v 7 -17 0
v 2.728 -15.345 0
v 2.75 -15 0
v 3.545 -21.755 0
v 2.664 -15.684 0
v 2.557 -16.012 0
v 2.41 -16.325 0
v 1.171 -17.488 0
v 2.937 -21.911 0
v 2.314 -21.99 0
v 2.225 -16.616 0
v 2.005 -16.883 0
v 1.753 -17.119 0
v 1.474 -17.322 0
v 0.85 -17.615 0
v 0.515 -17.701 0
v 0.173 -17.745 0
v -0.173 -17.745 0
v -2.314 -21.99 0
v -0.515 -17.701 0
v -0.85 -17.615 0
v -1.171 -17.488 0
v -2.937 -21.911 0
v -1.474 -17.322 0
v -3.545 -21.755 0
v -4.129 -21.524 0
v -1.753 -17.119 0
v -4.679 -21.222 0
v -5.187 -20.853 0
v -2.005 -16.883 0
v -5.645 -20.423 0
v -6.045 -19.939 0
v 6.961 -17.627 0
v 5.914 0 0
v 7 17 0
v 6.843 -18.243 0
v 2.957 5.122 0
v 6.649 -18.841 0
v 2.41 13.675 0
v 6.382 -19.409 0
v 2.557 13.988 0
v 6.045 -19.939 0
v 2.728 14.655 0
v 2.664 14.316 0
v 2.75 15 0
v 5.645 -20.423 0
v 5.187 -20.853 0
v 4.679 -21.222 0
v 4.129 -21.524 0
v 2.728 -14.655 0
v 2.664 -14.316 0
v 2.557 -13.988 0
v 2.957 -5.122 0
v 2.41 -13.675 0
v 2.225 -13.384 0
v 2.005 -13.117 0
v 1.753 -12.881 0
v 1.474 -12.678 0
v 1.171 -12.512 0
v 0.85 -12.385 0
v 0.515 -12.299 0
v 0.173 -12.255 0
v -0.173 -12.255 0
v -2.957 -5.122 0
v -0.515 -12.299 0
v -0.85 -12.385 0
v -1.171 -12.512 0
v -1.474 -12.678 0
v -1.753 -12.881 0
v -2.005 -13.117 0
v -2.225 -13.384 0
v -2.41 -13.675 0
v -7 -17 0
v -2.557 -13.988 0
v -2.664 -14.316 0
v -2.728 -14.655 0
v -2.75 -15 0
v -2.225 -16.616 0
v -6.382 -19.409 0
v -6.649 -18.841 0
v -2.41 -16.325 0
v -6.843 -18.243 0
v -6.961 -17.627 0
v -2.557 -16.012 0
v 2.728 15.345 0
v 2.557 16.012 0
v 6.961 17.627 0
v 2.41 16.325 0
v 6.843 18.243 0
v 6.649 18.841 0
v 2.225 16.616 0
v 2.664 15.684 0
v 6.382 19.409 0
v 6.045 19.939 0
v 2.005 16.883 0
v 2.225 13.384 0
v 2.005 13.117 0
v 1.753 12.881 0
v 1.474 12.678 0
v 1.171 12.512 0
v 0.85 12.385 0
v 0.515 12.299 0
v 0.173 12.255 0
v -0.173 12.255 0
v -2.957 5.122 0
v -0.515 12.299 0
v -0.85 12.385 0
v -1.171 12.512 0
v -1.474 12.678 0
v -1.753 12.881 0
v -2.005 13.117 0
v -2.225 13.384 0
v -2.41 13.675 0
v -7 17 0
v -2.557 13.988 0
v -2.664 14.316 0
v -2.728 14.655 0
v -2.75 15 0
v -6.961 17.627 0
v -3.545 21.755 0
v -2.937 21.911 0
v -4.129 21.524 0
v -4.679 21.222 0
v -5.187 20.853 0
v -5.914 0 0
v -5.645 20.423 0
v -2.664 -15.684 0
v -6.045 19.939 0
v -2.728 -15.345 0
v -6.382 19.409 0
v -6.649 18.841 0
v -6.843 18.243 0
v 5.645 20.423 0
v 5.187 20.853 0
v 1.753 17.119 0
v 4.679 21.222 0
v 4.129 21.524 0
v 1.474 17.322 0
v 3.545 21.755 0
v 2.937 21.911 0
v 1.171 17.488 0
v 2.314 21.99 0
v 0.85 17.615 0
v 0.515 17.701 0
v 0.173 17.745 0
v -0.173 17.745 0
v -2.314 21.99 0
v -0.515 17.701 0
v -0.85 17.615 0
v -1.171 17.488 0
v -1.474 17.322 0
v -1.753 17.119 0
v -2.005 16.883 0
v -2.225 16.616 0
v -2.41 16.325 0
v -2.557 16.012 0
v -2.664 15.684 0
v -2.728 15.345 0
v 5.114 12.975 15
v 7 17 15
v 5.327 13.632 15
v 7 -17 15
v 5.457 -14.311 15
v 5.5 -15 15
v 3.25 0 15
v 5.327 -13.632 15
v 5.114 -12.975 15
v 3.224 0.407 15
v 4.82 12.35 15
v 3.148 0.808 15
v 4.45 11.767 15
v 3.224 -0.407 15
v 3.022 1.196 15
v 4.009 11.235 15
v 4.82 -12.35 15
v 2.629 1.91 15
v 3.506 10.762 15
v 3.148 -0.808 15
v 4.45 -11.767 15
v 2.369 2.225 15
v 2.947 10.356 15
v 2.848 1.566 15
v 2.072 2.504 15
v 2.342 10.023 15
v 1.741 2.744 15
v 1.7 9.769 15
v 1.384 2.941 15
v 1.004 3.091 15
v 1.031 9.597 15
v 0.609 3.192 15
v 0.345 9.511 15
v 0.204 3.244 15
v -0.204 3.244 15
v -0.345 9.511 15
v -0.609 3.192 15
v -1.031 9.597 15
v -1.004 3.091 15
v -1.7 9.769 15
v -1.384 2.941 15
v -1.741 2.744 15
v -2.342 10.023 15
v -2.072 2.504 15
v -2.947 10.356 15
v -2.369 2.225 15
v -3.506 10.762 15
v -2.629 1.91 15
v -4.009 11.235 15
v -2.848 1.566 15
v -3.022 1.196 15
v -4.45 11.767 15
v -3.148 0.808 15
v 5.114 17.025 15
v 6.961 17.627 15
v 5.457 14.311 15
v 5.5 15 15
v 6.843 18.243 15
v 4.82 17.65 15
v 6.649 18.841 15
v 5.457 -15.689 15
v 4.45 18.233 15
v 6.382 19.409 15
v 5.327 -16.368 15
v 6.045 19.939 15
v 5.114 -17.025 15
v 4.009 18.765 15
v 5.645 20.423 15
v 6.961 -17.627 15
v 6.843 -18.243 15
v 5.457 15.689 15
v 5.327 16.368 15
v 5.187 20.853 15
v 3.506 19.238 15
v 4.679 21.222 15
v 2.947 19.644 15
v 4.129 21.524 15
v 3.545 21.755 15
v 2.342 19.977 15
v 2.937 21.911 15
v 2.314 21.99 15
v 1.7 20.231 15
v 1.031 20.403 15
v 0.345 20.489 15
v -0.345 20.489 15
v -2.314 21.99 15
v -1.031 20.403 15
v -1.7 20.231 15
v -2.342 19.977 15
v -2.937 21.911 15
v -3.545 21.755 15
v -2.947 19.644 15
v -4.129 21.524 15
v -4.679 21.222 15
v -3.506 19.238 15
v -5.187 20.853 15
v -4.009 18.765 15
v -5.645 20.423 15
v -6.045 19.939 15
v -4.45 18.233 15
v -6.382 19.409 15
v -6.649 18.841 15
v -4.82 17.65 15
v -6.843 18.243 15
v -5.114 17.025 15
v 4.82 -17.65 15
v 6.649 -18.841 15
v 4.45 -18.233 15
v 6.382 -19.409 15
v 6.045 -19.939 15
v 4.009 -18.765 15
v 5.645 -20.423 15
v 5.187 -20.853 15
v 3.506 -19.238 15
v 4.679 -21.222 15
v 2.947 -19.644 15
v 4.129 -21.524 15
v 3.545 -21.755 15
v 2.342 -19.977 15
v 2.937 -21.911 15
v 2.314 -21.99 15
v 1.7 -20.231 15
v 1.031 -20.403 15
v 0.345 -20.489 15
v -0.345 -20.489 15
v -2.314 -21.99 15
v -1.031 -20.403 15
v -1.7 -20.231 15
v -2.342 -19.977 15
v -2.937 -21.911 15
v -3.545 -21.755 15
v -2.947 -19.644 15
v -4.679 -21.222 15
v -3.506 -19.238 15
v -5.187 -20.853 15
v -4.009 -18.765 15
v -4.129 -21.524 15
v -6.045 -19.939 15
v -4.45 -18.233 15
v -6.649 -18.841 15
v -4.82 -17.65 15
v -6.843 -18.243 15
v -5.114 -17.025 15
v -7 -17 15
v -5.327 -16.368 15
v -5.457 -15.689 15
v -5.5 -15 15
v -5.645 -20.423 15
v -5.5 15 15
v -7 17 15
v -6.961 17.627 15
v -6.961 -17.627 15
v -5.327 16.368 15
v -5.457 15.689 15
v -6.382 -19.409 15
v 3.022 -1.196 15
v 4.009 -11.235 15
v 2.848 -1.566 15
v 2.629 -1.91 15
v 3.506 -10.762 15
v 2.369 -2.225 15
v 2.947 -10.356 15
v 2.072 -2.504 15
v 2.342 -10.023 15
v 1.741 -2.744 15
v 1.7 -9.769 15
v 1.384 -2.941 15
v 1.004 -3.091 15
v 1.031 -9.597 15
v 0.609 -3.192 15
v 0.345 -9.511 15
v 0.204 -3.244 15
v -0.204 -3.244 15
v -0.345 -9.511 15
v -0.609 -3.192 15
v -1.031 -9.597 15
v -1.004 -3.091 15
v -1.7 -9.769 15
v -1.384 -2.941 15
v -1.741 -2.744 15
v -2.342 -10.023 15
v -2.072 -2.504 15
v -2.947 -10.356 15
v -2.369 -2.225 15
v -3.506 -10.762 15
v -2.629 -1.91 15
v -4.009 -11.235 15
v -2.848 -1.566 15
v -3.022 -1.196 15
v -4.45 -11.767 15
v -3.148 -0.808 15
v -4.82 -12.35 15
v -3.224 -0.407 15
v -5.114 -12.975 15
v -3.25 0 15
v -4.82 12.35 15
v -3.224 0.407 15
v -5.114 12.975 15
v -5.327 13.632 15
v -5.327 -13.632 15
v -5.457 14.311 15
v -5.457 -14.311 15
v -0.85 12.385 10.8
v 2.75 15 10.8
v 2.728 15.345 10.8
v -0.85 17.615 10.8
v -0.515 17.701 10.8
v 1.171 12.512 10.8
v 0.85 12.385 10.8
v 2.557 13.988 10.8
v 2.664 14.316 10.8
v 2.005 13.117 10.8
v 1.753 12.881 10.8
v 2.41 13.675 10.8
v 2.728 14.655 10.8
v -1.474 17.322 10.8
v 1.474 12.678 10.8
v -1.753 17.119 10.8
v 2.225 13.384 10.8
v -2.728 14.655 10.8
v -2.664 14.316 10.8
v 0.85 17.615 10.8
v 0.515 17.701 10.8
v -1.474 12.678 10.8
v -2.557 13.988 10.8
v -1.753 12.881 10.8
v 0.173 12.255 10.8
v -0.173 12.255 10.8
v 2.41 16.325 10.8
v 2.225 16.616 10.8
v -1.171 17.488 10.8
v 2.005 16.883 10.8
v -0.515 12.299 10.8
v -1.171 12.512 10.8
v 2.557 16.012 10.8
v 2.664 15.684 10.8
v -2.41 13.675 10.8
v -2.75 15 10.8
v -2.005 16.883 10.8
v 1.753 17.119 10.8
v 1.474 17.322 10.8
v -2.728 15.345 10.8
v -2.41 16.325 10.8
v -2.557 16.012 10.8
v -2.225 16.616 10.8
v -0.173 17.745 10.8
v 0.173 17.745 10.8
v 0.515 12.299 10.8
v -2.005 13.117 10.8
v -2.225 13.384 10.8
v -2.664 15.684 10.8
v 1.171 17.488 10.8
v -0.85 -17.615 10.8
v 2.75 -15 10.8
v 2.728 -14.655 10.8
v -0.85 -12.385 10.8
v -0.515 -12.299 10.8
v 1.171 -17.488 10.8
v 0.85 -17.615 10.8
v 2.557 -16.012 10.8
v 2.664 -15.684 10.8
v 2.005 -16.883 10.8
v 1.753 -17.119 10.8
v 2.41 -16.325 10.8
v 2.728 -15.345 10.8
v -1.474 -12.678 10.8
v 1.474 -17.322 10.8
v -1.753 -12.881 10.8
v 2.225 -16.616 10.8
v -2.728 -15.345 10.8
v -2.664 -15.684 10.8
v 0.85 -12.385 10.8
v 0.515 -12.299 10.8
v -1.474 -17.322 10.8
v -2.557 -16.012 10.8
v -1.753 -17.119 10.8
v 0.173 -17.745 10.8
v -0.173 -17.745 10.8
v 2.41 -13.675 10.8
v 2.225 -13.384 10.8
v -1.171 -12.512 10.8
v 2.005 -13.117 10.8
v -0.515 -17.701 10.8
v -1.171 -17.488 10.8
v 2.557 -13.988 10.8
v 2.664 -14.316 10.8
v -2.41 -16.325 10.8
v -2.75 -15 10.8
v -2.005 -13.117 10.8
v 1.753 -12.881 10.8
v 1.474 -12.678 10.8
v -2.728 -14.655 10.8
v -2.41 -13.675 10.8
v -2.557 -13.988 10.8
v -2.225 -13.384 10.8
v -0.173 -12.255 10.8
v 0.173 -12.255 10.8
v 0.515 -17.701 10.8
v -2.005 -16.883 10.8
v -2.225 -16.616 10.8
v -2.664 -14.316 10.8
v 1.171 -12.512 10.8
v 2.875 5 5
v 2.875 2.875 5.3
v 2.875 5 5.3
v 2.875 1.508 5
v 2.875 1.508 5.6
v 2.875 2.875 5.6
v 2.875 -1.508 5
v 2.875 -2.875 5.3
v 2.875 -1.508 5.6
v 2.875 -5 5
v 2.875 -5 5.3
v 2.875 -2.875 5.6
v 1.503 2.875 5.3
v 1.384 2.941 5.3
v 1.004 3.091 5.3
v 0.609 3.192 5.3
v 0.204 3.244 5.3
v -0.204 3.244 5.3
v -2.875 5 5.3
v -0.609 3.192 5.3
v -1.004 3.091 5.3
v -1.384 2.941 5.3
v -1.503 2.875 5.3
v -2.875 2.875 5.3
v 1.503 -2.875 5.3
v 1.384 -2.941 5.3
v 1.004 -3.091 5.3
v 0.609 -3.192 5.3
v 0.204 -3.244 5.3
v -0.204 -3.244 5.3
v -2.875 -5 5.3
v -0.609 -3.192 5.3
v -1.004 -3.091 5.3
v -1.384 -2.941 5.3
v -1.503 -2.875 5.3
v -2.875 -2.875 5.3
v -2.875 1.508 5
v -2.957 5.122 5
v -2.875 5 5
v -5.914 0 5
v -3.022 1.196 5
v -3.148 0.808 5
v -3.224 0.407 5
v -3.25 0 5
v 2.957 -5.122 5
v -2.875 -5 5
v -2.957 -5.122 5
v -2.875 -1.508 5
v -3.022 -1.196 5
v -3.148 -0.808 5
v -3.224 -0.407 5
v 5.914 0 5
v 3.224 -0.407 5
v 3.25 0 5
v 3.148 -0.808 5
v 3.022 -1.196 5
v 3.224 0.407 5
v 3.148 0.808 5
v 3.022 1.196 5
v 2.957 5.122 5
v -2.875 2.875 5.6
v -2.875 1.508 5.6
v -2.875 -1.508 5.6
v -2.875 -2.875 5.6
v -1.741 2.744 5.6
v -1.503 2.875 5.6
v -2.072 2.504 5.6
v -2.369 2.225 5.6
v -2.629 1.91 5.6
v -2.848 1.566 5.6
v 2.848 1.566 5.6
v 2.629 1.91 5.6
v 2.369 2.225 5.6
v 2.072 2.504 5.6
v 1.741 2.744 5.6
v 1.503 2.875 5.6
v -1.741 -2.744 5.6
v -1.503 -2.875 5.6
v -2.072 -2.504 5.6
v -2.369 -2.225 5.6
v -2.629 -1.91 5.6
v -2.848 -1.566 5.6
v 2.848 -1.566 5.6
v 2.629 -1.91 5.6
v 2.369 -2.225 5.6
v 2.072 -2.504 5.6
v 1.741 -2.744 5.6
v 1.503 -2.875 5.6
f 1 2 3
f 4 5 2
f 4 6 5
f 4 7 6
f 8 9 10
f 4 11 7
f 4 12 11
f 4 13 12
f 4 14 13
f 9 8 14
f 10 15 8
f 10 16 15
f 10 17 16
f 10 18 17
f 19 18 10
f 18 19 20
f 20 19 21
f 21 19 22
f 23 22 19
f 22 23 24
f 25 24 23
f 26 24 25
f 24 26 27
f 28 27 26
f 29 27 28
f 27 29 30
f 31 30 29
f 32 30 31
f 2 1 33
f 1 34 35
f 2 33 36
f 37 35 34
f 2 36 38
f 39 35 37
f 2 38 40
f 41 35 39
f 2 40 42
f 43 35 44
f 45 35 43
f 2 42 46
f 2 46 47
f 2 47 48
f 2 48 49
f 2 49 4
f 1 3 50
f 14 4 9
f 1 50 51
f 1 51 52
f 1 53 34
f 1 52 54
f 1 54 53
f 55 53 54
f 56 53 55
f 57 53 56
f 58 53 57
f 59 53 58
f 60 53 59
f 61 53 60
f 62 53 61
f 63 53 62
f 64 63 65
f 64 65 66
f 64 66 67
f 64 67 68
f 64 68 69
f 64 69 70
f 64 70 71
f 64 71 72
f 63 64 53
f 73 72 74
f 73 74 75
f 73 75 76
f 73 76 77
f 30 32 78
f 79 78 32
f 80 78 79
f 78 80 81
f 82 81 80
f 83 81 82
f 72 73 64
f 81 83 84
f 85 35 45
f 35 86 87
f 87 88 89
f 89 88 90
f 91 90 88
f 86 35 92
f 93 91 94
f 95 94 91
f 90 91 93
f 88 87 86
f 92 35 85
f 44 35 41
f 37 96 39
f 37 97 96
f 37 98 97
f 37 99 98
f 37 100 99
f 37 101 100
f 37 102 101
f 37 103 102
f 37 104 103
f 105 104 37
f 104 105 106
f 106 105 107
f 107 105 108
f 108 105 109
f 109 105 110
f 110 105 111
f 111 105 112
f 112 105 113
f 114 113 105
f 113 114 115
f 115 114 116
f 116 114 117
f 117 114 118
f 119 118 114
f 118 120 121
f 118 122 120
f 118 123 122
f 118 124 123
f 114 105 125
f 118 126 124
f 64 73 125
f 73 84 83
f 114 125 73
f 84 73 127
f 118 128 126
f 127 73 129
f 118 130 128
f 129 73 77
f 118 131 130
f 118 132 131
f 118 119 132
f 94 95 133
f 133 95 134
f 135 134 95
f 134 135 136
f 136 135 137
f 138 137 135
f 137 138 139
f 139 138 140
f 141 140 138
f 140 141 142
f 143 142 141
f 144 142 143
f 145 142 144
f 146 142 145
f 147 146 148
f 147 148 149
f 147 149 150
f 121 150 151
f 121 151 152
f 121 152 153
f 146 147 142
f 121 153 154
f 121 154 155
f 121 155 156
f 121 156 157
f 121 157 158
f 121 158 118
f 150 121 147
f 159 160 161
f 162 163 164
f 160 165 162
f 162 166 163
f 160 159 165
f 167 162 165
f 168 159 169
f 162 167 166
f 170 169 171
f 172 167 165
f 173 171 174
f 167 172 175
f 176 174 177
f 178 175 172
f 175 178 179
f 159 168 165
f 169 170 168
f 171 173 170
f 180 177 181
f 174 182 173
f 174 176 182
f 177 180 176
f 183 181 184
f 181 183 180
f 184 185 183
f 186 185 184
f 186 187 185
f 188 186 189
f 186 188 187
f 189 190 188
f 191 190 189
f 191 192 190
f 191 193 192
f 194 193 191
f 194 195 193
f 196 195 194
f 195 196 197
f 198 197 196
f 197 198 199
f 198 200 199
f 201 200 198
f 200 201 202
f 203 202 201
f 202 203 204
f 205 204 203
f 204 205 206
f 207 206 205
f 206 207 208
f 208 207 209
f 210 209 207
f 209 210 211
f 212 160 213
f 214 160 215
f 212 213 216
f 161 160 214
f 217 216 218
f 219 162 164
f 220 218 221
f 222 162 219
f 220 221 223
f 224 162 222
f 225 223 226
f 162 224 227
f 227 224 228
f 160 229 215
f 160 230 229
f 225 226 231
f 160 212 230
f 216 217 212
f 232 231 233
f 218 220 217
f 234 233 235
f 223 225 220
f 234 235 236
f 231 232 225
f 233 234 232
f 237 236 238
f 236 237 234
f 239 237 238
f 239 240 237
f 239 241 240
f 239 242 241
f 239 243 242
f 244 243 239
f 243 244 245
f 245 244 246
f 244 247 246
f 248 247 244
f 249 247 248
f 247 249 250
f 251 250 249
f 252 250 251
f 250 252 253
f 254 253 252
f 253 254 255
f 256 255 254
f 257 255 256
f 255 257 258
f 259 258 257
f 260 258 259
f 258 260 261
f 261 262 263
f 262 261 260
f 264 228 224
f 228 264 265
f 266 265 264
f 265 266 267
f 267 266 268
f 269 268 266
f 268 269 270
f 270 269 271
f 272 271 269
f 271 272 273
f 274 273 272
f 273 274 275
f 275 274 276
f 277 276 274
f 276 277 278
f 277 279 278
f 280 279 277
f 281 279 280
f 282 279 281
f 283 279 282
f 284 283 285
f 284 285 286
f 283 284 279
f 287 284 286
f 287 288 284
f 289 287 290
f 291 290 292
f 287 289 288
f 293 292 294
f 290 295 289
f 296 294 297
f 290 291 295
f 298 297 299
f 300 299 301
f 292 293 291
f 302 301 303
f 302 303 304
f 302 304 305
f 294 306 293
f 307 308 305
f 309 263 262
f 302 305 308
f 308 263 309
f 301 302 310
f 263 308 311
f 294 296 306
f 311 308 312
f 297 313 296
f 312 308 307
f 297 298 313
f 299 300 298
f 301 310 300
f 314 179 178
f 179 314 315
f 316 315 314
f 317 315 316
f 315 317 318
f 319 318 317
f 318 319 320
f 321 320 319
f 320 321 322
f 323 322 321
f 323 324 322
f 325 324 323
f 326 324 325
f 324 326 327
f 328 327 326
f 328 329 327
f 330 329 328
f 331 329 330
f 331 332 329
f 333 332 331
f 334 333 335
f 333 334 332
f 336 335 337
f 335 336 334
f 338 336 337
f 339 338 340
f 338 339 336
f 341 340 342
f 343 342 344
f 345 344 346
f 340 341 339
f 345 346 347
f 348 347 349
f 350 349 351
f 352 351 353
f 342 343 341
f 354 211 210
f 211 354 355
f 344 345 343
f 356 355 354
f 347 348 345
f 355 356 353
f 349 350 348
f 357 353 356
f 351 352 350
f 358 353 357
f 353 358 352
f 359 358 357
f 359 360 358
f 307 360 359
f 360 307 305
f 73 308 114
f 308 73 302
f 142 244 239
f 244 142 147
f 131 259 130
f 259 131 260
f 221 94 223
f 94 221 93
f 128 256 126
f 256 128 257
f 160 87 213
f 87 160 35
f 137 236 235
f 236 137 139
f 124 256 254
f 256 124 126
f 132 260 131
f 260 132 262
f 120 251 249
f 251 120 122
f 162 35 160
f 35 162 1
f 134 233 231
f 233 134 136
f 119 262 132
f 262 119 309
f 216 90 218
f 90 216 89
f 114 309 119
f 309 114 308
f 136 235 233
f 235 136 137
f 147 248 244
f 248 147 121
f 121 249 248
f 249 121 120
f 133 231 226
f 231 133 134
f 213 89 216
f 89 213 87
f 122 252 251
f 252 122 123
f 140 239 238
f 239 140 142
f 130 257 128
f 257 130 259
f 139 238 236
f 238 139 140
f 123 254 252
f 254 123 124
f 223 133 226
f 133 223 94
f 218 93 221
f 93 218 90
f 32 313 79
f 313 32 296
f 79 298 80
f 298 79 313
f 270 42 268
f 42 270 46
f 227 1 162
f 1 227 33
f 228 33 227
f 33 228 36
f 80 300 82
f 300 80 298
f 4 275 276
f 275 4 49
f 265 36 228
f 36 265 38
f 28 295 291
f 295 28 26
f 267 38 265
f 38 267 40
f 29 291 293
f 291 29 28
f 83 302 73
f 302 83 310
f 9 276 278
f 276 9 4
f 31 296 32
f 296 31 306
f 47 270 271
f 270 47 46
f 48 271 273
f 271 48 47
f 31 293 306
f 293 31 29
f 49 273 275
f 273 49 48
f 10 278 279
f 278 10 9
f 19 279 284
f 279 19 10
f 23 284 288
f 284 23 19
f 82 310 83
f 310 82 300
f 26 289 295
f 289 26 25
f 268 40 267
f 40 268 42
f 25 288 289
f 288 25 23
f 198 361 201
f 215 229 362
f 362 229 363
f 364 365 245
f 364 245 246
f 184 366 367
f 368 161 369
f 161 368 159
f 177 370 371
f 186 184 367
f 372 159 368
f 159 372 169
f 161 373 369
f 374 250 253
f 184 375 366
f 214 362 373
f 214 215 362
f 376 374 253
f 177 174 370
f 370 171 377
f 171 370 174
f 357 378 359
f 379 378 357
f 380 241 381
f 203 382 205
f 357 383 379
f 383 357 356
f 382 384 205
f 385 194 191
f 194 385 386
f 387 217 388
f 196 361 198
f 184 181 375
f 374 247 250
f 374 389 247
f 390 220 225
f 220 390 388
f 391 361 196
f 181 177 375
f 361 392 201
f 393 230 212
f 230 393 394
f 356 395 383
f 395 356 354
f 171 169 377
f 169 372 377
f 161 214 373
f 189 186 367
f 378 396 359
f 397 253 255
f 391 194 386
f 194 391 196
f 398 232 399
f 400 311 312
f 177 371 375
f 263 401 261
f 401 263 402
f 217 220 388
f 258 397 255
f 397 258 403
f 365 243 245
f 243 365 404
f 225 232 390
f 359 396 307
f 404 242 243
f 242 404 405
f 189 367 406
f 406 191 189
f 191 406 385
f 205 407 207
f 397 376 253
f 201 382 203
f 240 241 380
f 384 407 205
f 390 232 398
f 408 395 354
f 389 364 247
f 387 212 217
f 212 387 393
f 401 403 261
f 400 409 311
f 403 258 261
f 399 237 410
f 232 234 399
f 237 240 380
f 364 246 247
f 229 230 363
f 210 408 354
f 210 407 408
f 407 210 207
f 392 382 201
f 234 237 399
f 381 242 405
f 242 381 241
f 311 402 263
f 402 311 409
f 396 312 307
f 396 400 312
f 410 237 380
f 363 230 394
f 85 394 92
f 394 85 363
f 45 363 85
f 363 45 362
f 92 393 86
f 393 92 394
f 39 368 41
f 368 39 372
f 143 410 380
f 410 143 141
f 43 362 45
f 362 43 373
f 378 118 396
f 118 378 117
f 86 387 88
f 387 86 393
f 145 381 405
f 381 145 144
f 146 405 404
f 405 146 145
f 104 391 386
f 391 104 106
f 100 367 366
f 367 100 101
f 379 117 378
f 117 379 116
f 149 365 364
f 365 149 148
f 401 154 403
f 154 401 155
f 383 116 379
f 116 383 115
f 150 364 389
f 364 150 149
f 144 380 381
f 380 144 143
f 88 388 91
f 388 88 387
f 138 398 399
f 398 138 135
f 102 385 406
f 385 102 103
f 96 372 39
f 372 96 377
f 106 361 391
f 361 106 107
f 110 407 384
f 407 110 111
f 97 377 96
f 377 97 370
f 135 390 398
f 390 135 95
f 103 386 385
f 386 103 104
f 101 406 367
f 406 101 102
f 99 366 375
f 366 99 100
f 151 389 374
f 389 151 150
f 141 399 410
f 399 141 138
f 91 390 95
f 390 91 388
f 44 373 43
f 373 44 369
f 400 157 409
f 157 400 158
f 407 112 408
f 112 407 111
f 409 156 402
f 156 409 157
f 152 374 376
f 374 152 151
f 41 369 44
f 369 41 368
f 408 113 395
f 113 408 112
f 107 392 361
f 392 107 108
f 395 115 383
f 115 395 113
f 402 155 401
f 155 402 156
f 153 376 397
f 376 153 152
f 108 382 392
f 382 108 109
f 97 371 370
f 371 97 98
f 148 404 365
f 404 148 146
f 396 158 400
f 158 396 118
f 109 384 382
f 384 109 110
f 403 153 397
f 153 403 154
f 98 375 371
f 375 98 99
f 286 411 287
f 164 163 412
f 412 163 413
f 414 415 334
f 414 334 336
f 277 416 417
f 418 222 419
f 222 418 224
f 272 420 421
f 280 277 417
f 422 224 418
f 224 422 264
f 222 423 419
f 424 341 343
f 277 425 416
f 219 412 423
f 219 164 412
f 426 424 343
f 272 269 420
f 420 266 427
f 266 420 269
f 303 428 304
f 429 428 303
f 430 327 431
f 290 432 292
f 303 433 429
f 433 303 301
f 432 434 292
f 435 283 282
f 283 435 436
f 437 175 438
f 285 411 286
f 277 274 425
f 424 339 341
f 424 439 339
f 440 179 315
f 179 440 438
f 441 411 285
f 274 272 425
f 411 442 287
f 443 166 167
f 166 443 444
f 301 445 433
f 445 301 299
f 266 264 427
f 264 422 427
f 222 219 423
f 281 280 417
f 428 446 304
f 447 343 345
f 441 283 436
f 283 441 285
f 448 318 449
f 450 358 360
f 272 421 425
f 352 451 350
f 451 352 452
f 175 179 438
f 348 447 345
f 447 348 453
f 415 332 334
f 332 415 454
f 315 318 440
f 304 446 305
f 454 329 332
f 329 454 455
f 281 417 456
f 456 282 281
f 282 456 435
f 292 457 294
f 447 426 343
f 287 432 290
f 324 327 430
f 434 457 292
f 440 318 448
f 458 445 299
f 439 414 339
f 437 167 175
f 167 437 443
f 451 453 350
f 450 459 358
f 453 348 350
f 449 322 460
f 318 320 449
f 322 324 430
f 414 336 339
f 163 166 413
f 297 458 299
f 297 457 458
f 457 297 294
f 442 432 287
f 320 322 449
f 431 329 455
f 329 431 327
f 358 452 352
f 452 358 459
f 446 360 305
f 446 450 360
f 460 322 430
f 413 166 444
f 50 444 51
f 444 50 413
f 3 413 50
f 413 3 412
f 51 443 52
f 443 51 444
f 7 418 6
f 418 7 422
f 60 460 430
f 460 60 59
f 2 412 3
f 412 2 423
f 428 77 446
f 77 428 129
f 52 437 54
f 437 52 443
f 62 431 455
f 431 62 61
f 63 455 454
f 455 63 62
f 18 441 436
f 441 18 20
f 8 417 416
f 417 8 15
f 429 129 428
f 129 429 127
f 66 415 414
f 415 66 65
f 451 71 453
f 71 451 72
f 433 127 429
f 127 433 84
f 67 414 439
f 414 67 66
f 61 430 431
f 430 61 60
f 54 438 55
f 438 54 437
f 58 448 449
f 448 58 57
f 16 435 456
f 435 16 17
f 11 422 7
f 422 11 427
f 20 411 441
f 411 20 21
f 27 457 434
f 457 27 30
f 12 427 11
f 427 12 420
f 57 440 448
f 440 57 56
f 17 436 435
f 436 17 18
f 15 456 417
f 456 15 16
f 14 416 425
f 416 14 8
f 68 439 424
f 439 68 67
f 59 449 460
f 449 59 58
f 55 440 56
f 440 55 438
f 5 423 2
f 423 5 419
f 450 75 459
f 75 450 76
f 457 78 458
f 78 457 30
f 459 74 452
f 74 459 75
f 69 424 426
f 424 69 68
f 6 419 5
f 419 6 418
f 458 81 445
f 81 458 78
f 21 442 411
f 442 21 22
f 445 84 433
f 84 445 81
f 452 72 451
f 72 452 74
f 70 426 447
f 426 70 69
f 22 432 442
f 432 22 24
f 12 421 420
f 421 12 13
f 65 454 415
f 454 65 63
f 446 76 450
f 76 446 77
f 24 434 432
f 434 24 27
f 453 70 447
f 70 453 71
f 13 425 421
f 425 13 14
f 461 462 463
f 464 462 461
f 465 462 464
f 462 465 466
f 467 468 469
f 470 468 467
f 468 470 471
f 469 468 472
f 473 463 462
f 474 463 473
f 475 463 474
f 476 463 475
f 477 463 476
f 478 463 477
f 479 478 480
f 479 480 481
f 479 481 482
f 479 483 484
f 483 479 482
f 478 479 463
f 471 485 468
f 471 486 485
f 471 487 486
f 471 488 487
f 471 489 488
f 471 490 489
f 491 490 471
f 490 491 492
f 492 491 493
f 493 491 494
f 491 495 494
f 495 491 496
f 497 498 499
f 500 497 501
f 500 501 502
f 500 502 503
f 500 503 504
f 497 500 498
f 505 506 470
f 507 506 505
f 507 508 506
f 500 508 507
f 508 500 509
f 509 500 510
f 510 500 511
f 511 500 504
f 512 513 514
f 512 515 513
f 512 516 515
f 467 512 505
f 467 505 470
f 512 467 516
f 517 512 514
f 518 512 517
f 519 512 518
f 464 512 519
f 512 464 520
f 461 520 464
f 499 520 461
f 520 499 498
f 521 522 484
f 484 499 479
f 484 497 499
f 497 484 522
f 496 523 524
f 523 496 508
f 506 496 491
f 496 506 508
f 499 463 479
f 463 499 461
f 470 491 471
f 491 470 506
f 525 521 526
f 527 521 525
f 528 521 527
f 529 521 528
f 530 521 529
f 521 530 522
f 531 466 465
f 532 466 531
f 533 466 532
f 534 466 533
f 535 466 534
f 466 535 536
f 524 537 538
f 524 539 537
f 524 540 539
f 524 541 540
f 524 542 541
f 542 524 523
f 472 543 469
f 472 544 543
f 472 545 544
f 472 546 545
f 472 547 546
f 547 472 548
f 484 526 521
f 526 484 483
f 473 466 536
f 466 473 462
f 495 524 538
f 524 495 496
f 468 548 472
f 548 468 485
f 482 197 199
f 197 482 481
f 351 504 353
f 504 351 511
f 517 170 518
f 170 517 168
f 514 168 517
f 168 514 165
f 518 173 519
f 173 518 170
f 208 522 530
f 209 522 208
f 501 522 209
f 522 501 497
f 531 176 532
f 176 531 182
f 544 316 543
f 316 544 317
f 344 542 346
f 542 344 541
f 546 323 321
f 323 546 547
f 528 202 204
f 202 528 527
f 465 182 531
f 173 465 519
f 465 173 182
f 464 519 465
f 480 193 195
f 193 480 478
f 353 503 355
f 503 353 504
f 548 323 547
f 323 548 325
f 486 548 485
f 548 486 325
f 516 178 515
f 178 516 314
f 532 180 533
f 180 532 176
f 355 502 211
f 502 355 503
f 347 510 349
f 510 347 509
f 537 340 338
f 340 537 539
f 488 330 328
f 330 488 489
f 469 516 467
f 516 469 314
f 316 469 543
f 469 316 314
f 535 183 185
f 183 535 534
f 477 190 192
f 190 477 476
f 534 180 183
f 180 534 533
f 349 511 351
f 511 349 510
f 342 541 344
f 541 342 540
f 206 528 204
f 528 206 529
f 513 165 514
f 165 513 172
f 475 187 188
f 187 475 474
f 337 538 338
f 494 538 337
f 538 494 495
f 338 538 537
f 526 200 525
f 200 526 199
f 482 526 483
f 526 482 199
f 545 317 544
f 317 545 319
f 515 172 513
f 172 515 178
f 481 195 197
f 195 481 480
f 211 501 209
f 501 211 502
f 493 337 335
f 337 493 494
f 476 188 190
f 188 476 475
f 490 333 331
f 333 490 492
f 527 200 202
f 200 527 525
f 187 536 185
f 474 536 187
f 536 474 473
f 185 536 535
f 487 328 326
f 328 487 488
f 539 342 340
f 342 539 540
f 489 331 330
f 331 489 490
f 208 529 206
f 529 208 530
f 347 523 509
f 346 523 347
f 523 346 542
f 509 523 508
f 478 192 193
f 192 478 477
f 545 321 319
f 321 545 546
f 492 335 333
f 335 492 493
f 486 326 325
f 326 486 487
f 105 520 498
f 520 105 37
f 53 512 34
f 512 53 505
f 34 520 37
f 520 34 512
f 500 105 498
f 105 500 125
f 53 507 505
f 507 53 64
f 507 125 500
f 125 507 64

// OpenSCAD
$fn = 50;


difference() {
	union() {
		cylinder(h = 15, r = 7.0000000000);
		translate(v = [0.0000000000, 7.5000000000, 0]) {
			hull() {
				translate(v = [-2.0000000000, 9.5000000000, 0]) {
					cylinder(h = 15, r = 5);
				}
				translate(v = [2.0000000000, 9.5000000000, 0]) {
					cylinder(h = 15, r = 5);
				}
				translate(v = [-2.0000000000, -9.5000000000, 0]) {
					cylinder(h = 15, r = 5);
				}
				translate(v = [2.0000000000, -9.5000000000, 0]) {
					cylinder(h = 15, r = 5);
				}
			}
		}
		translate(v = [0.0000000000, 7.5000000000, 0]) {
			hull() {
				translate(v = [-2.0000000000, 9.5000000000, 0]) {
					cylinder(h = 15, r = 5);
				}
				translate(v = [2.0000000000, 9.5000000000, 0]) {
					cylinder(h = 15, r = 5);
				}
				translate(v = [-2.0000000000, -9.5000000000, 0]) {
					cylinder(h = 15, r = 5);
				}
				translate(v = [2.0000000000, -9.5000000000, 0]) {
					cylinder(h = 15, r = 5);
				}
			}
		}
		translate(v = [0.0000000000, -7.5000000000, 0]) {
			hull() {
				translate(v = [-2.0000000000, 9.5000000000, 0]) {
					cylinder(h = 15, r = 5);
				}
				translate(v = [2.0000000000, 9.5000000000, 0]) {
					cylinder(h = 15, r = 5);
				}
				translate(v = [-2.0000000000, -9.5000000000, 0]) {
					cylinder(h = 15, r = 5);
				}
				translate(v = [2.0000000000, -9.5000000000, 0]) {
					cylinder(h = 15, r = 5);
				}
			}
		}
		translate(v = [0.0000000000, -7.5000000000, 0]) {
			hull() {
				translate(v = [-2.0000000000, 9.5000000000, 0]) {
					cylinder(h = 15, r = 5);
				}
				translate(v = [2.0000000000, 9.5000000000, 0]) {
					cylinder(h = 15, r = 5);
				}
				translate(v = [-2.0000000000, -9.5000000000, 0]) {
					cylinder(h = 15, r = 5);
				}
				translate(v = [2.0000000000, -9.5000000000, 0]) {
					cylinder(h = 15, r = 5);
				}
			}
		}
	}
	union() {
		translate(v = [0.0000000000, 15.0000000000, 15]) {
			rotate(a = [0, 0, 0]) {
				difference() {
					union() {
						#translate(v = [0, 0, -15.0000000000]) {
							cylinder(h = 15, r = 2.2500000000);
						}
						#translate(v = [0, 0, -4.2000000000]) {
							cylinder(h = 4.2000000000, r1 = 2.7500000000, r2 = 5.5000000000);
						}
						#translate(v = [0, 0, -15.0000000000]) {
							cylinder(h = 15, r = 2.7500000000);
						}
						#translate(v = [0, 0, -15.0000000000]) {
							cylinder(h = 15, r = 2.2500000000);
						}
					}
					union();
				}
			}
		}
		translate(v = [0.0000000000, 15.0000000000, 15]) {
			rotate(a = [0, 0, 0]) {
				difference() {
					union() {
						#translate(v = [0, 0, -15.0000000000]) {
							cylinder(h = 15, r = 2.2500000000);
						}
						#translate(v = [0, 0, -4.2000000000]) {
							cylinder(h = 4.2000000000, r1 = 2.7500000000, r2 = 5.5000000000);
						}
						#translate(v = [0, 0, -15.0000000000]) {
							cylinder(h = 15, r = 2.7500000000);
						}
						#translate(v = [0, 0, -15.0000000000]) {
							cylinder(h = 15, r = 2.2500000000);
						}
					}
					union();
				}
			}
		}
		translate(v = [0.0000000000, -15.0000000000, 15]) {
			rotate(a = [0, 0, 0]) {
				difference() {
					union() {
						#translate(v = [0, 0, -15.0000000000]) {
							cylinder(h = 15, r = 2.2500000000);
						}
						#translate(v = [0, 0, -4.2000000000]) {
							cylinder(h = 4.2000000000, r1 = 2.7500000000, r2 = 5.5000000000);
						}
						#translate(v = [0, 0, -15.0000000000]) {
							cylinder(h = 15, r = 2.7500000000);
						}
						#translate(v = [0, 0, -15.0000000000]) {
							cylinder(h = 15, r = 2.2500000000);
						}
					}
					union();
				}
			}
		}
		translate(v = [0.0000000000, -15.0000000000, 15]) {
			rotate(a = [0, 0, 0]) {
				difference() {
					union() {
						#translate(v = [0, 0, -15.0000000000]) {
							cylinder(h = 15, r = 2.2500000000);
						}
						#translate(v = [0, 0, -4.2000000000]) {
							cylinder(h = 4.2000000000, r1 = 2.7500000000, r2 = 5.5000000000);
						}
						#translate(v = [0, 0, -15.0000000000]) {
							cylinder(h = 15, r = 2.7500000000);
						}
						#translate(v = [0, 0, -15.0000000000]) {
							cylinder(h = 15, r = 2.2500000000);
						}
					}
					union();
				}
			}
		}
		translate(v = [0.0000000000, 0.0000000000, 0]) {
			rotate(a = [0, 0, 0]) {
				difference() {
					union() {
						#translate(v = [-2.8750000000, -5.0000000000, -0.3000000000]) {
							cube(size = [5.7500000000, 10, 0.3000000000]);
						}
						#translate(v = [-2.8750000000, -2.8750000000, -0.6000000000]) {
							cube(size = [5.7500000000, 5.7500000000, 0.3000000000]);
						}
						#translate(v = [-2.8750000000, -5.0000000000, 5]) {
							cube(size = [5.7500000000, 10, 0.3000000000]);
						}
						#translate(v = [-2.8750000000, -2.8750000000, 5.3000000000]) {
							cube(size = [5.7500000000, 5.7500000000, 0.3000000000]);
						}
						#translate(v = [0, 0, -100.0000000000]) {
							cylinder(h = 200, r = 3.2500000000);
						}
						#linear_extrude(height = 5) {
							polygon(points = [[5.9142500000, 0.0000000000], [2.9571250000, 5.1218907443], [-2.9571250000, 5.1218907443], [-5.9142500000, 0.0000000000], [-2.9571250000, -5.1218907443], [2.9571250000, -5.1218907443]]);
						}
						#translate(v = [-2.8750000000, -5.0000000000, -0.3000000000]) {
							cube(size = [5.7500000000, 10, 0.3000000000]);
						}
						#translate(v = [-2.8750000000, -2.8750000000, -0.6000000000]) {
							cube(size = [5.7500000000, 5.7500000000, 0.3000000000]);
						}
						#translate(v = [-2.8750000000, -5.0000000000, 5]) {
							cube(size = [5.7500000000, 10, 0.3000000000]);
						}
						#translate(v = [-2.8750000000, -2.8750000000, 5.3000000000]) {
							cube(size = [5.7500000000, 5.7500000000, 0.3000000000]);
						}
						#translate(v = [0, 0, -100.0000000000]) {
							cylinder(h = 200, r = 3.2500000000);
						}
						#translate(v = [-2.8750000000, -5.0000000000, -0.3000000000]) {
							cube(size = [5.7500000000, 10, 0.3000000000]);
						}
						#translate(v = [-2.8750000000, -2.8750000000, -0.6000000000]) {
							cube(size = [5.7500000000, 5.7500000000, 0.3000000000]);
						}
						#translate(v = [-2.8750000000, -5.0000000000, 5]) {
							cube(size = [5.7500000000, 10, 0.3000000000]);
						}
						#translate(v = [-2.8750000000, -2.8750000000, 5.3000000000]) {
							cube(size = [5.7500000000, 5.7500000000, 0.3000000000]);
						}
						#translate(v = [0, 0, -100.0000000000]) {
							cylinder(h = 200, r = 3.2500000000);
						}
					}
					union();
				}
			}
		}
		translate(v = [0, 0, -100]) {
			cylinder(h = 200, r = 3.2500000000);
		}
		translate(v = [0, 0, -100]) {
			cylinder(h = 200, r = 1.8000000000);
		}
	}
}
